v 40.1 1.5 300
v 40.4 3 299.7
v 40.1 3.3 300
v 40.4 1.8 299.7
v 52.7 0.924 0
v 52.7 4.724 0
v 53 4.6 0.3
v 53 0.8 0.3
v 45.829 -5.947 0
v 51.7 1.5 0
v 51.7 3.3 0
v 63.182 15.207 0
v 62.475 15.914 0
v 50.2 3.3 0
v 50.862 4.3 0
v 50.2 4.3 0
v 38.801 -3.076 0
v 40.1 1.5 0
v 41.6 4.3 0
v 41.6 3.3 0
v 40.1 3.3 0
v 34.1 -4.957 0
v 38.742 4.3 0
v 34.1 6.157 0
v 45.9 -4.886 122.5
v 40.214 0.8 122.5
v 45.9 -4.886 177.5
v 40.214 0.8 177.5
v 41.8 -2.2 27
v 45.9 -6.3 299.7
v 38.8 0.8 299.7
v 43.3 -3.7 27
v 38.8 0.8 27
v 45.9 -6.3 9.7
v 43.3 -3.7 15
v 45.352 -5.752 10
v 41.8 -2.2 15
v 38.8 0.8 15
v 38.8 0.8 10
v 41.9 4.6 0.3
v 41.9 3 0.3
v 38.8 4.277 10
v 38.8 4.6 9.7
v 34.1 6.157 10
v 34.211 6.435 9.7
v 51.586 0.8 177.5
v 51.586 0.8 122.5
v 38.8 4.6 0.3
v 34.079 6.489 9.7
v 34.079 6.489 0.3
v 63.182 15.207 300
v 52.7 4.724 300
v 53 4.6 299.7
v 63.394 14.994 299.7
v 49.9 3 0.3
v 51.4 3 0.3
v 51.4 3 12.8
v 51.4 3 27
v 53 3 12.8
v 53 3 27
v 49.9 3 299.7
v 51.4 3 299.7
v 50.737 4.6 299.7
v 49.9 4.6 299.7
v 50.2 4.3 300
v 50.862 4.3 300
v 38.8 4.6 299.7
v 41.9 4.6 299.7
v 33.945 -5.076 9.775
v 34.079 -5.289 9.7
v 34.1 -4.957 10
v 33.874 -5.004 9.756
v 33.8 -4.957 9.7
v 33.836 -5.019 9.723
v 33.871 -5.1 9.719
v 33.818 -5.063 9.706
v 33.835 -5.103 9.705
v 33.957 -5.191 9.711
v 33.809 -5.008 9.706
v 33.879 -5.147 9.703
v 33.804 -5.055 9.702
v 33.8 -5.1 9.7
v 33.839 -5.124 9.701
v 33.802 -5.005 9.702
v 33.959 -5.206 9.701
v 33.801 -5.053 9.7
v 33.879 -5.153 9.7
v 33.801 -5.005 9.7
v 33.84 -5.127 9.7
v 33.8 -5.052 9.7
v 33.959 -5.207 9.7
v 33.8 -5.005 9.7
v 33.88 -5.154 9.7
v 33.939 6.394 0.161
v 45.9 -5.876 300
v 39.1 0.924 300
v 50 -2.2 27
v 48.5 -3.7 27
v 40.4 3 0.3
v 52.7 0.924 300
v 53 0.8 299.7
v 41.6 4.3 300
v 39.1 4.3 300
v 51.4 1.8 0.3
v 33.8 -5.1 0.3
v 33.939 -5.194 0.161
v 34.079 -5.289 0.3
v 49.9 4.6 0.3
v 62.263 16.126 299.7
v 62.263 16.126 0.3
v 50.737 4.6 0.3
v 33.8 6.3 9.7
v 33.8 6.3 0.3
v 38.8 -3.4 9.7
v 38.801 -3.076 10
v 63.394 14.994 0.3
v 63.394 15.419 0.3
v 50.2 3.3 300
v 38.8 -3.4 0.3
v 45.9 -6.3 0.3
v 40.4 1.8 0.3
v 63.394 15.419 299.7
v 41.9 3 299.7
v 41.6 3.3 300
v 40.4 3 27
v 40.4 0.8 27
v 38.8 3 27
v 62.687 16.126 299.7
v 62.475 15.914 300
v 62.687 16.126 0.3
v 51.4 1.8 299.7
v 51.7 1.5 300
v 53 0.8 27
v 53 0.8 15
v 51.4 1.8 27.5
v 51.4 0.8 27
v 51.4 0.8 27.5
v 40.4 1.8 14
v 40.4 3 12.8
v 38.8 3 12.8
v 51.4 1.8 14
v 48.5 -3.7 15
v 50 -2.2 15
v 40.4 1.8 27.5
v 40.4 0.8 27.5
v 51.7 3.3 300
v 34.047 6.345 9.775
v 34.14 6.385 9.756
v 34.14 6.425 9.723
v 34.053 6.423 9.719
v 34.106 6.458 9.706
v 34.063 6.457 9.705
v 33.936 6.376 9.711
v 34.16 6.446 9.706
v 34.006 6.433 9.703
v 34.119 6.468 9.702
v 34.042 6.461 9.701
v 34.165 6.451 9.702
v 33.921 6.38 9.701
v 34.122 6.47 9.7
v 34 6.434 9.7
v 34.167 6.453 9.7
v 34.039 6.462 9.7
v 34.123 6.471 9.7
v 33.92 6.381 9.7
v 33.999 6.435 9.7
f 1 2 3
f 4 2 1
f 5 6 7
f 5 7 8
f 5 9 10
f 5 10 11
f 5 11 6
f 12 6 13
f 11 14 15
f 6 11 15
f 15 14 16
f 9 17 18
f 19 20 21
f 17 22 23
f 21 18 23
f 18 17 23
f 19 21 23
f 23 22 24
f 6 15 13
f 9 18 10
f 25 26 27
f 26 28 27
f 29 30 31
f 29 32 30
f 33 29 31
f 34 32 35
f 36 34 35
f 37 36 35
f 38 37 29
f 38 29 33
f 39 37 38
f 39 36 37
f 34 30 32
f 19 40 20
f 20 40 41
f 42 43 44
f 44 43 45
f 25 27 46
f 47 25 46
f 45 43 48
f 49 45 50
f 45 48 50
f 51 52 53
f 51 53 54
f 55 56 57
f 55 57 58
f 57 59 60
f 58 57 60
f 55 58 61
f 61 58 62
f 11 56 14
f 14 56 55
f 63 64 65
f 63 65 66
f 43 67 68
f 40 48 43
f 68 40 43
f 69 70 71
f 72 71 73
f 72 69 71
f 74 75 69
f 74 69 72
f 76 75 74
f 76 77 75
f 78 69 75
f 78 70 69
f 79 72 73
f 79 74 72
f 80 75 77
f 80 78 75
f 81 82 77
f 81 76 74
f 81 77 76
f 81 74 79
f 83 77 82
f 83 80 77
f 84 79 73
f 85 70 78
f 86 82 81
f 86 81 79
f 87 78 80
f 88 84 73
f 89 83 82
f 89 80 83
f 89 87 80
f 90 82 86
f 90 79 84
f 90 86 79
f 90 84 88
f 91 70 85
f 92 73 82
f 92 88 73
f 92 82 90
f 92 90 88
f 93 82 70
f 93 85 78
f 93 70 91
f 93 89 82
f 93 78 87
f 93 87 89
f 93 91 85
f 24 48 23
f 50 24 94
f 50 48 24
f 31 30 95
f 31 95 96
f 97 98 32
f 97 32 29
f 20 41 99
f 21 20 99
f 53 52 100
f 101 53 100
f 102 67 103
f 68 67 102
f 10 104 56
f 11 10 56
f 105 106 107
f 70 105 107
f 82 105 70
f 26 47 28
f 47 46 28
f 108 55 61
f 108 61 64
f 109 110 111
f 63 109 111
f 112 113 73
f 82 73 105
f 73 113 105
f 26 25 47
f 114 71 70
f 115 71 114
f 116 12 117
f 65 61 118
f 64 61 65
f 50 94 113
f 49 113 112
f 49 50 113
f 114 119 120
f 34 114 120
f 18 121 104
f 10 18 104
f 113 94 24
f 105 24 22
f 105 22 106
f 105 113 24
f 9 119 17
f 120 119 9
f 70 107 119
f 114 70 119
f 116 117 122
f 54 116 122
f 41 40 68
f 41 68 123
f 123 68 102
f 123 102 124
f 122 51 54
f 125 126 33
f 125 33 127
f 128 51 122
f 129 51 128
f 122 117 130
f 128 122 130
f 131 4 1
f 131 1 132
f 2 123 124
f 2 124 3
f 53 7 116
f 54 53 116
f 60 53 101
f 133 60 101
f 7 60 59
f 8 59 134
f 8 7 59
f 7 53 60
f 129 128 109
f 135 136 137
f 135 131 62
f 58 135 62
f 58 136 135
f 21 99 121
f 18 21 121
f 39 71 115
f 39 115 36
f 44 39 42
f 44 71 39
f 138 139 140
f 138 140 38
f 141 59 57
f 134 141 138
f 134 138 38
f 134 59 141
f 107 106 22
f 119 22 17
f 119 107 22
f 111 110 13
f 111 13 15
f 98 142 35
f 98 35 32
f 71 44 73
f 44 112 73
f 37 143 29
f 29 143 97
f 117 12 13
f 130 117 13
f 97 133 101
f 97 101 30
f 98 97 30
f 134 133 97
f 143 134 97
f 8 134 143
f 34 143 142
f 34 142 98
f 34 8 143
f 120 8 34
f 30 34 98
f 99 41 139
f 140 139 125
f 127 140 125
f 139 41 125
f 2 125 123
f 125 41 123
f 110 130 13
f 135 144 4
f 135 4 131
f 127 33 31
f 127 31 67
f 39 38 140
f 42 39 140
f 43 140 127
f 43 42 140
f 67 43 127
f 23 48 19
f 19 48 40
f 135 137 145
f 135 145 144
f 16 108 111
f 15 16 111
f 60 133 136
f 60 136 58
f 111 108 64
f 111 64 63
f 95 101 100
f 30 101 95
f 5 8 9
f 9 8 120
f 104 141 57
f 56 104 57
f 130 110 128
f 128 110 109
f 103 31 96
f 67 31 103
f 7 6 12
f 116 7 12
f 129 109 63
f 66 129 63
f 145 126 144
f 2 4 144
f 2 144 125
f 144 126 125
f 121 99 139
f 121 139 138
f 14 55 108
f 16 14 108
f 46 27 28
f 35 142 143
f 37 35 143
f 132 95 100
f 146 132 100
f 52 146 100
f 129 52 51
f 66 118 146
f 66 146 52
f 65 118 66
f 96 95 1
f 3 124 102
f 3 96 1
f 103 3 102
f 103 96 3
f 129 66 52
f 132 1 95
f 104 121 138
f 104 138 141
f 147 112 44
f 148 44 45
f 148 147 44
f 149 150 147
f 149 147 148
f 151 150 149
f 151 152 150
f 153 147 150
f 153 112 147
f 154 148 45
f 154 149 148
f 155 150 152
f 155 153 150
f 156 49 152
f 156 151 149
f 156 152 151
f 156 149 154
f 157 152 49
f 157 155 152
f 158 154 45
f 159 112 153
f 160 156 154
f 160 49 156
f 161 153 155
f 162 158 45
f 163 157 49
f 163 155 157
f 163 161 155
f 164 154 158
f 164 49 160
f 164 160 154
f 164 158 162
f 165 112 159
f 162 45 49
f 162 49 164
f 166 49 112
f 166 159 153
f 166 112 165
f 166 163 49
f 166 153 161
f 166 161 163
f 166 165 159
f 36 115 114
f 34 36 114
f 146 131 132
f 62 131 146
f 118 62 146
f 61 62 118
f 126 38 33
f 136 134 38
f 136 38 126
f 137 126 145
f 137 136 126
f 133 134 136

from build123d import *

# Parameters (mm, degrees)
PAD006_DEPTH            = 300
PAD007_DEPTH            = 10
PAD010_DEPTH            = 10
POCKET001_DEPTH         = 27.5
PAD016_DEPTH            = 300
CHAMFER007_SIZE         = 0.3
CHAMFER008_SIZE         = 0.3
SKETCH018_W             = 1.5
SKETCH018_H             = 12
POCKET002_DEPTH         = 19.201
SKETCH025_W             = 1
SKETCH025_H             = 11
POCKET005_DEPTH         = 0.5
BODY002_PLACEMENT_ANGLE = 90


with BuildPart() as part:
    # Sketch008 → Pad006 (new body)
    with BuildSketch(Plane.XY):
        Polygon((3.8, 3.1), (3.8, 0), (0, 0), (-7.1, 7.1), (0, 14.2), (3.8, 14.2), (3.8, 11.1), (2.2, 11.1), (2.2, 12.6), (1, 12.6), (1, 1.6), (2.2, 1.6), (2.2, 3.1), align=None)
    extrude(amount=PAD006_DEPTH)

    # Sketch010 → Pad007 (join)
    with BuildSketch(Plane(origin=(0, 0, 0), x_dir=(-1, 0, 0), z_dir=(0, 0, -1))):
        Polygon((-3.8, 14.2), (-5.8, 19.2), (6.2, 19.2), (4.2, 14.2), align=None)
    extrude(amount=-PAD007_DEPTH)

    # Sketch013 → Pad010 (join)
    with BuildSketch(Plane(origin=(0, 0, 0), x_dir=(-1, 0, 0), z_dir=(0, 0, -1))):
        Polygon((4.2, 14.2), (7.1, 7.1), (0, 14.2), align=None)
    extrude(amount=-PAD010_DEPTH)

    # Sketch014 (on DatumPlane) → Pocket001 (cut, symmetric)
    with BuildSketch(Plane.XY.offset(150)):
        Polygon((0, 12.785786), (-5.685786, 7.1), (0, 1.414214), align=None)
    extrude(amount=POCKET001_DEPTH, both=True, mode=Mode.SUBTRACT)

    # Sketch021 → Pad016 (join)
    with BuildSketch(Plane.XY):
        Polygon((3.8, 0), (14.406602, -10.606602), (15.537973, -9.475231), (3.8, 2.262742), align=None)
    extrude(amount=PAD016_DEPTH)

    # Chamfer007
    chamfer007_edges = [part.edges().sort_by_distance(p)[0] for p in [
        (-5.2, 16.7, 0),
        (-5.65, 10.65, 0),
        (-3.55, 3.55, 0),
        (9.103301, -5.303301, 0),
        (9.103301, -5.303301, 300),
        (2.2, 2.35, 0),
        (14.972287, -10.040916, 0),
        (14.972287, -10.040916, 300),
        (1, 7.1, 0),
        (-0.2, 19.2, 0),
        (1.9, 0, 0),
        (1.6, 1.6, 0),
        (1.6, 12.6, 0),
        (2.2, 11.85, 0),
        (1.9, 0, 300),
        (-3.55, 3.55, 300),
        (-3.55, 10.65, 300),
        (1.9, 14.2, 300),
        (2.2, 2.35, 300),
        (1.6, 1.6, 300),
        (1, 7.1, 300),
        (1.6, 12.6, 300),
        (2.2, 11.85, 300),
        (14.406602, -10.606602, 150),
        (15.537973, -9.475231, 150),
        (3, 11.1, 0),
        (3.8, 12.65, 0),
        (4.8, 16.7, 0),
        (9.668986, -3.606245, 0),
        (3.8, 2.681371, 0),
        (3, 3.1, 0),
        (9.668986, -3.606245, 300),
        (3.8, 12.65, 300),
        (3.8, 2.681371, 300),
        (3, 3.1, 300),
        (3, 11.1, 300),
    ]]
    chamfer(chamfer007_edges, length=CHAMFER007_SIZE)

    # Chamfer008
    chamfer008_edges = [part.edges().sort_by_distance(p)[0] for p in [
        (-6.2, 19.2, 5.15),
        (5.8, 19.2, 5.15),
        (-5.65, 10.65, 10),
        (-5.2, 16.7, 10),
        (-0.2, 19.2, 10),
        (4.8, 16.7, 10),
    ]]
    chamfer(chamfer008_edges, length=CHAMFER008_SIZE)

    # Sketch018 (on Face32 of Chamfer008) → Pocket002 (cut, through all)
    with BuildSketch(Plane.XZ):
        with Locations((-3.75, 21)):
            Rectangle(SKETCH018_W, SKETCH018_H)
        Polygon((0, 15), (0, 27), (2.2, 27), (2.2, 15), (2.2, 12.8), align=None)
    extrude(amount=-POCKET002_DEPTH, mode=Mode.SUBTRACT)

    # Sketch025 (on Face57 of Pocket002) → Pocket005 (cut)
    with BuildSketch(Plane(origin=(0, 0, 27), x_dir=(1, 0, 0), z_dir=(0, 0, -1))):
        with Locations((0.5, -7.1)):
            Rectangle(SKETCH025_W, SKETCH025_H)
    extrude(amount=-POCKET005_DEPTH, mode=Mode.SUBTRACT)


with BuildPart() as part_1:
    # Body002 placement: moved
    add(part.part.moved(Location((53, 0.8, 0))).rotate(Axis((53, 0.8, 0), (0, 0, 1)), BODY002_PLACEMENT_ANGLE))


solid = part_1.part
